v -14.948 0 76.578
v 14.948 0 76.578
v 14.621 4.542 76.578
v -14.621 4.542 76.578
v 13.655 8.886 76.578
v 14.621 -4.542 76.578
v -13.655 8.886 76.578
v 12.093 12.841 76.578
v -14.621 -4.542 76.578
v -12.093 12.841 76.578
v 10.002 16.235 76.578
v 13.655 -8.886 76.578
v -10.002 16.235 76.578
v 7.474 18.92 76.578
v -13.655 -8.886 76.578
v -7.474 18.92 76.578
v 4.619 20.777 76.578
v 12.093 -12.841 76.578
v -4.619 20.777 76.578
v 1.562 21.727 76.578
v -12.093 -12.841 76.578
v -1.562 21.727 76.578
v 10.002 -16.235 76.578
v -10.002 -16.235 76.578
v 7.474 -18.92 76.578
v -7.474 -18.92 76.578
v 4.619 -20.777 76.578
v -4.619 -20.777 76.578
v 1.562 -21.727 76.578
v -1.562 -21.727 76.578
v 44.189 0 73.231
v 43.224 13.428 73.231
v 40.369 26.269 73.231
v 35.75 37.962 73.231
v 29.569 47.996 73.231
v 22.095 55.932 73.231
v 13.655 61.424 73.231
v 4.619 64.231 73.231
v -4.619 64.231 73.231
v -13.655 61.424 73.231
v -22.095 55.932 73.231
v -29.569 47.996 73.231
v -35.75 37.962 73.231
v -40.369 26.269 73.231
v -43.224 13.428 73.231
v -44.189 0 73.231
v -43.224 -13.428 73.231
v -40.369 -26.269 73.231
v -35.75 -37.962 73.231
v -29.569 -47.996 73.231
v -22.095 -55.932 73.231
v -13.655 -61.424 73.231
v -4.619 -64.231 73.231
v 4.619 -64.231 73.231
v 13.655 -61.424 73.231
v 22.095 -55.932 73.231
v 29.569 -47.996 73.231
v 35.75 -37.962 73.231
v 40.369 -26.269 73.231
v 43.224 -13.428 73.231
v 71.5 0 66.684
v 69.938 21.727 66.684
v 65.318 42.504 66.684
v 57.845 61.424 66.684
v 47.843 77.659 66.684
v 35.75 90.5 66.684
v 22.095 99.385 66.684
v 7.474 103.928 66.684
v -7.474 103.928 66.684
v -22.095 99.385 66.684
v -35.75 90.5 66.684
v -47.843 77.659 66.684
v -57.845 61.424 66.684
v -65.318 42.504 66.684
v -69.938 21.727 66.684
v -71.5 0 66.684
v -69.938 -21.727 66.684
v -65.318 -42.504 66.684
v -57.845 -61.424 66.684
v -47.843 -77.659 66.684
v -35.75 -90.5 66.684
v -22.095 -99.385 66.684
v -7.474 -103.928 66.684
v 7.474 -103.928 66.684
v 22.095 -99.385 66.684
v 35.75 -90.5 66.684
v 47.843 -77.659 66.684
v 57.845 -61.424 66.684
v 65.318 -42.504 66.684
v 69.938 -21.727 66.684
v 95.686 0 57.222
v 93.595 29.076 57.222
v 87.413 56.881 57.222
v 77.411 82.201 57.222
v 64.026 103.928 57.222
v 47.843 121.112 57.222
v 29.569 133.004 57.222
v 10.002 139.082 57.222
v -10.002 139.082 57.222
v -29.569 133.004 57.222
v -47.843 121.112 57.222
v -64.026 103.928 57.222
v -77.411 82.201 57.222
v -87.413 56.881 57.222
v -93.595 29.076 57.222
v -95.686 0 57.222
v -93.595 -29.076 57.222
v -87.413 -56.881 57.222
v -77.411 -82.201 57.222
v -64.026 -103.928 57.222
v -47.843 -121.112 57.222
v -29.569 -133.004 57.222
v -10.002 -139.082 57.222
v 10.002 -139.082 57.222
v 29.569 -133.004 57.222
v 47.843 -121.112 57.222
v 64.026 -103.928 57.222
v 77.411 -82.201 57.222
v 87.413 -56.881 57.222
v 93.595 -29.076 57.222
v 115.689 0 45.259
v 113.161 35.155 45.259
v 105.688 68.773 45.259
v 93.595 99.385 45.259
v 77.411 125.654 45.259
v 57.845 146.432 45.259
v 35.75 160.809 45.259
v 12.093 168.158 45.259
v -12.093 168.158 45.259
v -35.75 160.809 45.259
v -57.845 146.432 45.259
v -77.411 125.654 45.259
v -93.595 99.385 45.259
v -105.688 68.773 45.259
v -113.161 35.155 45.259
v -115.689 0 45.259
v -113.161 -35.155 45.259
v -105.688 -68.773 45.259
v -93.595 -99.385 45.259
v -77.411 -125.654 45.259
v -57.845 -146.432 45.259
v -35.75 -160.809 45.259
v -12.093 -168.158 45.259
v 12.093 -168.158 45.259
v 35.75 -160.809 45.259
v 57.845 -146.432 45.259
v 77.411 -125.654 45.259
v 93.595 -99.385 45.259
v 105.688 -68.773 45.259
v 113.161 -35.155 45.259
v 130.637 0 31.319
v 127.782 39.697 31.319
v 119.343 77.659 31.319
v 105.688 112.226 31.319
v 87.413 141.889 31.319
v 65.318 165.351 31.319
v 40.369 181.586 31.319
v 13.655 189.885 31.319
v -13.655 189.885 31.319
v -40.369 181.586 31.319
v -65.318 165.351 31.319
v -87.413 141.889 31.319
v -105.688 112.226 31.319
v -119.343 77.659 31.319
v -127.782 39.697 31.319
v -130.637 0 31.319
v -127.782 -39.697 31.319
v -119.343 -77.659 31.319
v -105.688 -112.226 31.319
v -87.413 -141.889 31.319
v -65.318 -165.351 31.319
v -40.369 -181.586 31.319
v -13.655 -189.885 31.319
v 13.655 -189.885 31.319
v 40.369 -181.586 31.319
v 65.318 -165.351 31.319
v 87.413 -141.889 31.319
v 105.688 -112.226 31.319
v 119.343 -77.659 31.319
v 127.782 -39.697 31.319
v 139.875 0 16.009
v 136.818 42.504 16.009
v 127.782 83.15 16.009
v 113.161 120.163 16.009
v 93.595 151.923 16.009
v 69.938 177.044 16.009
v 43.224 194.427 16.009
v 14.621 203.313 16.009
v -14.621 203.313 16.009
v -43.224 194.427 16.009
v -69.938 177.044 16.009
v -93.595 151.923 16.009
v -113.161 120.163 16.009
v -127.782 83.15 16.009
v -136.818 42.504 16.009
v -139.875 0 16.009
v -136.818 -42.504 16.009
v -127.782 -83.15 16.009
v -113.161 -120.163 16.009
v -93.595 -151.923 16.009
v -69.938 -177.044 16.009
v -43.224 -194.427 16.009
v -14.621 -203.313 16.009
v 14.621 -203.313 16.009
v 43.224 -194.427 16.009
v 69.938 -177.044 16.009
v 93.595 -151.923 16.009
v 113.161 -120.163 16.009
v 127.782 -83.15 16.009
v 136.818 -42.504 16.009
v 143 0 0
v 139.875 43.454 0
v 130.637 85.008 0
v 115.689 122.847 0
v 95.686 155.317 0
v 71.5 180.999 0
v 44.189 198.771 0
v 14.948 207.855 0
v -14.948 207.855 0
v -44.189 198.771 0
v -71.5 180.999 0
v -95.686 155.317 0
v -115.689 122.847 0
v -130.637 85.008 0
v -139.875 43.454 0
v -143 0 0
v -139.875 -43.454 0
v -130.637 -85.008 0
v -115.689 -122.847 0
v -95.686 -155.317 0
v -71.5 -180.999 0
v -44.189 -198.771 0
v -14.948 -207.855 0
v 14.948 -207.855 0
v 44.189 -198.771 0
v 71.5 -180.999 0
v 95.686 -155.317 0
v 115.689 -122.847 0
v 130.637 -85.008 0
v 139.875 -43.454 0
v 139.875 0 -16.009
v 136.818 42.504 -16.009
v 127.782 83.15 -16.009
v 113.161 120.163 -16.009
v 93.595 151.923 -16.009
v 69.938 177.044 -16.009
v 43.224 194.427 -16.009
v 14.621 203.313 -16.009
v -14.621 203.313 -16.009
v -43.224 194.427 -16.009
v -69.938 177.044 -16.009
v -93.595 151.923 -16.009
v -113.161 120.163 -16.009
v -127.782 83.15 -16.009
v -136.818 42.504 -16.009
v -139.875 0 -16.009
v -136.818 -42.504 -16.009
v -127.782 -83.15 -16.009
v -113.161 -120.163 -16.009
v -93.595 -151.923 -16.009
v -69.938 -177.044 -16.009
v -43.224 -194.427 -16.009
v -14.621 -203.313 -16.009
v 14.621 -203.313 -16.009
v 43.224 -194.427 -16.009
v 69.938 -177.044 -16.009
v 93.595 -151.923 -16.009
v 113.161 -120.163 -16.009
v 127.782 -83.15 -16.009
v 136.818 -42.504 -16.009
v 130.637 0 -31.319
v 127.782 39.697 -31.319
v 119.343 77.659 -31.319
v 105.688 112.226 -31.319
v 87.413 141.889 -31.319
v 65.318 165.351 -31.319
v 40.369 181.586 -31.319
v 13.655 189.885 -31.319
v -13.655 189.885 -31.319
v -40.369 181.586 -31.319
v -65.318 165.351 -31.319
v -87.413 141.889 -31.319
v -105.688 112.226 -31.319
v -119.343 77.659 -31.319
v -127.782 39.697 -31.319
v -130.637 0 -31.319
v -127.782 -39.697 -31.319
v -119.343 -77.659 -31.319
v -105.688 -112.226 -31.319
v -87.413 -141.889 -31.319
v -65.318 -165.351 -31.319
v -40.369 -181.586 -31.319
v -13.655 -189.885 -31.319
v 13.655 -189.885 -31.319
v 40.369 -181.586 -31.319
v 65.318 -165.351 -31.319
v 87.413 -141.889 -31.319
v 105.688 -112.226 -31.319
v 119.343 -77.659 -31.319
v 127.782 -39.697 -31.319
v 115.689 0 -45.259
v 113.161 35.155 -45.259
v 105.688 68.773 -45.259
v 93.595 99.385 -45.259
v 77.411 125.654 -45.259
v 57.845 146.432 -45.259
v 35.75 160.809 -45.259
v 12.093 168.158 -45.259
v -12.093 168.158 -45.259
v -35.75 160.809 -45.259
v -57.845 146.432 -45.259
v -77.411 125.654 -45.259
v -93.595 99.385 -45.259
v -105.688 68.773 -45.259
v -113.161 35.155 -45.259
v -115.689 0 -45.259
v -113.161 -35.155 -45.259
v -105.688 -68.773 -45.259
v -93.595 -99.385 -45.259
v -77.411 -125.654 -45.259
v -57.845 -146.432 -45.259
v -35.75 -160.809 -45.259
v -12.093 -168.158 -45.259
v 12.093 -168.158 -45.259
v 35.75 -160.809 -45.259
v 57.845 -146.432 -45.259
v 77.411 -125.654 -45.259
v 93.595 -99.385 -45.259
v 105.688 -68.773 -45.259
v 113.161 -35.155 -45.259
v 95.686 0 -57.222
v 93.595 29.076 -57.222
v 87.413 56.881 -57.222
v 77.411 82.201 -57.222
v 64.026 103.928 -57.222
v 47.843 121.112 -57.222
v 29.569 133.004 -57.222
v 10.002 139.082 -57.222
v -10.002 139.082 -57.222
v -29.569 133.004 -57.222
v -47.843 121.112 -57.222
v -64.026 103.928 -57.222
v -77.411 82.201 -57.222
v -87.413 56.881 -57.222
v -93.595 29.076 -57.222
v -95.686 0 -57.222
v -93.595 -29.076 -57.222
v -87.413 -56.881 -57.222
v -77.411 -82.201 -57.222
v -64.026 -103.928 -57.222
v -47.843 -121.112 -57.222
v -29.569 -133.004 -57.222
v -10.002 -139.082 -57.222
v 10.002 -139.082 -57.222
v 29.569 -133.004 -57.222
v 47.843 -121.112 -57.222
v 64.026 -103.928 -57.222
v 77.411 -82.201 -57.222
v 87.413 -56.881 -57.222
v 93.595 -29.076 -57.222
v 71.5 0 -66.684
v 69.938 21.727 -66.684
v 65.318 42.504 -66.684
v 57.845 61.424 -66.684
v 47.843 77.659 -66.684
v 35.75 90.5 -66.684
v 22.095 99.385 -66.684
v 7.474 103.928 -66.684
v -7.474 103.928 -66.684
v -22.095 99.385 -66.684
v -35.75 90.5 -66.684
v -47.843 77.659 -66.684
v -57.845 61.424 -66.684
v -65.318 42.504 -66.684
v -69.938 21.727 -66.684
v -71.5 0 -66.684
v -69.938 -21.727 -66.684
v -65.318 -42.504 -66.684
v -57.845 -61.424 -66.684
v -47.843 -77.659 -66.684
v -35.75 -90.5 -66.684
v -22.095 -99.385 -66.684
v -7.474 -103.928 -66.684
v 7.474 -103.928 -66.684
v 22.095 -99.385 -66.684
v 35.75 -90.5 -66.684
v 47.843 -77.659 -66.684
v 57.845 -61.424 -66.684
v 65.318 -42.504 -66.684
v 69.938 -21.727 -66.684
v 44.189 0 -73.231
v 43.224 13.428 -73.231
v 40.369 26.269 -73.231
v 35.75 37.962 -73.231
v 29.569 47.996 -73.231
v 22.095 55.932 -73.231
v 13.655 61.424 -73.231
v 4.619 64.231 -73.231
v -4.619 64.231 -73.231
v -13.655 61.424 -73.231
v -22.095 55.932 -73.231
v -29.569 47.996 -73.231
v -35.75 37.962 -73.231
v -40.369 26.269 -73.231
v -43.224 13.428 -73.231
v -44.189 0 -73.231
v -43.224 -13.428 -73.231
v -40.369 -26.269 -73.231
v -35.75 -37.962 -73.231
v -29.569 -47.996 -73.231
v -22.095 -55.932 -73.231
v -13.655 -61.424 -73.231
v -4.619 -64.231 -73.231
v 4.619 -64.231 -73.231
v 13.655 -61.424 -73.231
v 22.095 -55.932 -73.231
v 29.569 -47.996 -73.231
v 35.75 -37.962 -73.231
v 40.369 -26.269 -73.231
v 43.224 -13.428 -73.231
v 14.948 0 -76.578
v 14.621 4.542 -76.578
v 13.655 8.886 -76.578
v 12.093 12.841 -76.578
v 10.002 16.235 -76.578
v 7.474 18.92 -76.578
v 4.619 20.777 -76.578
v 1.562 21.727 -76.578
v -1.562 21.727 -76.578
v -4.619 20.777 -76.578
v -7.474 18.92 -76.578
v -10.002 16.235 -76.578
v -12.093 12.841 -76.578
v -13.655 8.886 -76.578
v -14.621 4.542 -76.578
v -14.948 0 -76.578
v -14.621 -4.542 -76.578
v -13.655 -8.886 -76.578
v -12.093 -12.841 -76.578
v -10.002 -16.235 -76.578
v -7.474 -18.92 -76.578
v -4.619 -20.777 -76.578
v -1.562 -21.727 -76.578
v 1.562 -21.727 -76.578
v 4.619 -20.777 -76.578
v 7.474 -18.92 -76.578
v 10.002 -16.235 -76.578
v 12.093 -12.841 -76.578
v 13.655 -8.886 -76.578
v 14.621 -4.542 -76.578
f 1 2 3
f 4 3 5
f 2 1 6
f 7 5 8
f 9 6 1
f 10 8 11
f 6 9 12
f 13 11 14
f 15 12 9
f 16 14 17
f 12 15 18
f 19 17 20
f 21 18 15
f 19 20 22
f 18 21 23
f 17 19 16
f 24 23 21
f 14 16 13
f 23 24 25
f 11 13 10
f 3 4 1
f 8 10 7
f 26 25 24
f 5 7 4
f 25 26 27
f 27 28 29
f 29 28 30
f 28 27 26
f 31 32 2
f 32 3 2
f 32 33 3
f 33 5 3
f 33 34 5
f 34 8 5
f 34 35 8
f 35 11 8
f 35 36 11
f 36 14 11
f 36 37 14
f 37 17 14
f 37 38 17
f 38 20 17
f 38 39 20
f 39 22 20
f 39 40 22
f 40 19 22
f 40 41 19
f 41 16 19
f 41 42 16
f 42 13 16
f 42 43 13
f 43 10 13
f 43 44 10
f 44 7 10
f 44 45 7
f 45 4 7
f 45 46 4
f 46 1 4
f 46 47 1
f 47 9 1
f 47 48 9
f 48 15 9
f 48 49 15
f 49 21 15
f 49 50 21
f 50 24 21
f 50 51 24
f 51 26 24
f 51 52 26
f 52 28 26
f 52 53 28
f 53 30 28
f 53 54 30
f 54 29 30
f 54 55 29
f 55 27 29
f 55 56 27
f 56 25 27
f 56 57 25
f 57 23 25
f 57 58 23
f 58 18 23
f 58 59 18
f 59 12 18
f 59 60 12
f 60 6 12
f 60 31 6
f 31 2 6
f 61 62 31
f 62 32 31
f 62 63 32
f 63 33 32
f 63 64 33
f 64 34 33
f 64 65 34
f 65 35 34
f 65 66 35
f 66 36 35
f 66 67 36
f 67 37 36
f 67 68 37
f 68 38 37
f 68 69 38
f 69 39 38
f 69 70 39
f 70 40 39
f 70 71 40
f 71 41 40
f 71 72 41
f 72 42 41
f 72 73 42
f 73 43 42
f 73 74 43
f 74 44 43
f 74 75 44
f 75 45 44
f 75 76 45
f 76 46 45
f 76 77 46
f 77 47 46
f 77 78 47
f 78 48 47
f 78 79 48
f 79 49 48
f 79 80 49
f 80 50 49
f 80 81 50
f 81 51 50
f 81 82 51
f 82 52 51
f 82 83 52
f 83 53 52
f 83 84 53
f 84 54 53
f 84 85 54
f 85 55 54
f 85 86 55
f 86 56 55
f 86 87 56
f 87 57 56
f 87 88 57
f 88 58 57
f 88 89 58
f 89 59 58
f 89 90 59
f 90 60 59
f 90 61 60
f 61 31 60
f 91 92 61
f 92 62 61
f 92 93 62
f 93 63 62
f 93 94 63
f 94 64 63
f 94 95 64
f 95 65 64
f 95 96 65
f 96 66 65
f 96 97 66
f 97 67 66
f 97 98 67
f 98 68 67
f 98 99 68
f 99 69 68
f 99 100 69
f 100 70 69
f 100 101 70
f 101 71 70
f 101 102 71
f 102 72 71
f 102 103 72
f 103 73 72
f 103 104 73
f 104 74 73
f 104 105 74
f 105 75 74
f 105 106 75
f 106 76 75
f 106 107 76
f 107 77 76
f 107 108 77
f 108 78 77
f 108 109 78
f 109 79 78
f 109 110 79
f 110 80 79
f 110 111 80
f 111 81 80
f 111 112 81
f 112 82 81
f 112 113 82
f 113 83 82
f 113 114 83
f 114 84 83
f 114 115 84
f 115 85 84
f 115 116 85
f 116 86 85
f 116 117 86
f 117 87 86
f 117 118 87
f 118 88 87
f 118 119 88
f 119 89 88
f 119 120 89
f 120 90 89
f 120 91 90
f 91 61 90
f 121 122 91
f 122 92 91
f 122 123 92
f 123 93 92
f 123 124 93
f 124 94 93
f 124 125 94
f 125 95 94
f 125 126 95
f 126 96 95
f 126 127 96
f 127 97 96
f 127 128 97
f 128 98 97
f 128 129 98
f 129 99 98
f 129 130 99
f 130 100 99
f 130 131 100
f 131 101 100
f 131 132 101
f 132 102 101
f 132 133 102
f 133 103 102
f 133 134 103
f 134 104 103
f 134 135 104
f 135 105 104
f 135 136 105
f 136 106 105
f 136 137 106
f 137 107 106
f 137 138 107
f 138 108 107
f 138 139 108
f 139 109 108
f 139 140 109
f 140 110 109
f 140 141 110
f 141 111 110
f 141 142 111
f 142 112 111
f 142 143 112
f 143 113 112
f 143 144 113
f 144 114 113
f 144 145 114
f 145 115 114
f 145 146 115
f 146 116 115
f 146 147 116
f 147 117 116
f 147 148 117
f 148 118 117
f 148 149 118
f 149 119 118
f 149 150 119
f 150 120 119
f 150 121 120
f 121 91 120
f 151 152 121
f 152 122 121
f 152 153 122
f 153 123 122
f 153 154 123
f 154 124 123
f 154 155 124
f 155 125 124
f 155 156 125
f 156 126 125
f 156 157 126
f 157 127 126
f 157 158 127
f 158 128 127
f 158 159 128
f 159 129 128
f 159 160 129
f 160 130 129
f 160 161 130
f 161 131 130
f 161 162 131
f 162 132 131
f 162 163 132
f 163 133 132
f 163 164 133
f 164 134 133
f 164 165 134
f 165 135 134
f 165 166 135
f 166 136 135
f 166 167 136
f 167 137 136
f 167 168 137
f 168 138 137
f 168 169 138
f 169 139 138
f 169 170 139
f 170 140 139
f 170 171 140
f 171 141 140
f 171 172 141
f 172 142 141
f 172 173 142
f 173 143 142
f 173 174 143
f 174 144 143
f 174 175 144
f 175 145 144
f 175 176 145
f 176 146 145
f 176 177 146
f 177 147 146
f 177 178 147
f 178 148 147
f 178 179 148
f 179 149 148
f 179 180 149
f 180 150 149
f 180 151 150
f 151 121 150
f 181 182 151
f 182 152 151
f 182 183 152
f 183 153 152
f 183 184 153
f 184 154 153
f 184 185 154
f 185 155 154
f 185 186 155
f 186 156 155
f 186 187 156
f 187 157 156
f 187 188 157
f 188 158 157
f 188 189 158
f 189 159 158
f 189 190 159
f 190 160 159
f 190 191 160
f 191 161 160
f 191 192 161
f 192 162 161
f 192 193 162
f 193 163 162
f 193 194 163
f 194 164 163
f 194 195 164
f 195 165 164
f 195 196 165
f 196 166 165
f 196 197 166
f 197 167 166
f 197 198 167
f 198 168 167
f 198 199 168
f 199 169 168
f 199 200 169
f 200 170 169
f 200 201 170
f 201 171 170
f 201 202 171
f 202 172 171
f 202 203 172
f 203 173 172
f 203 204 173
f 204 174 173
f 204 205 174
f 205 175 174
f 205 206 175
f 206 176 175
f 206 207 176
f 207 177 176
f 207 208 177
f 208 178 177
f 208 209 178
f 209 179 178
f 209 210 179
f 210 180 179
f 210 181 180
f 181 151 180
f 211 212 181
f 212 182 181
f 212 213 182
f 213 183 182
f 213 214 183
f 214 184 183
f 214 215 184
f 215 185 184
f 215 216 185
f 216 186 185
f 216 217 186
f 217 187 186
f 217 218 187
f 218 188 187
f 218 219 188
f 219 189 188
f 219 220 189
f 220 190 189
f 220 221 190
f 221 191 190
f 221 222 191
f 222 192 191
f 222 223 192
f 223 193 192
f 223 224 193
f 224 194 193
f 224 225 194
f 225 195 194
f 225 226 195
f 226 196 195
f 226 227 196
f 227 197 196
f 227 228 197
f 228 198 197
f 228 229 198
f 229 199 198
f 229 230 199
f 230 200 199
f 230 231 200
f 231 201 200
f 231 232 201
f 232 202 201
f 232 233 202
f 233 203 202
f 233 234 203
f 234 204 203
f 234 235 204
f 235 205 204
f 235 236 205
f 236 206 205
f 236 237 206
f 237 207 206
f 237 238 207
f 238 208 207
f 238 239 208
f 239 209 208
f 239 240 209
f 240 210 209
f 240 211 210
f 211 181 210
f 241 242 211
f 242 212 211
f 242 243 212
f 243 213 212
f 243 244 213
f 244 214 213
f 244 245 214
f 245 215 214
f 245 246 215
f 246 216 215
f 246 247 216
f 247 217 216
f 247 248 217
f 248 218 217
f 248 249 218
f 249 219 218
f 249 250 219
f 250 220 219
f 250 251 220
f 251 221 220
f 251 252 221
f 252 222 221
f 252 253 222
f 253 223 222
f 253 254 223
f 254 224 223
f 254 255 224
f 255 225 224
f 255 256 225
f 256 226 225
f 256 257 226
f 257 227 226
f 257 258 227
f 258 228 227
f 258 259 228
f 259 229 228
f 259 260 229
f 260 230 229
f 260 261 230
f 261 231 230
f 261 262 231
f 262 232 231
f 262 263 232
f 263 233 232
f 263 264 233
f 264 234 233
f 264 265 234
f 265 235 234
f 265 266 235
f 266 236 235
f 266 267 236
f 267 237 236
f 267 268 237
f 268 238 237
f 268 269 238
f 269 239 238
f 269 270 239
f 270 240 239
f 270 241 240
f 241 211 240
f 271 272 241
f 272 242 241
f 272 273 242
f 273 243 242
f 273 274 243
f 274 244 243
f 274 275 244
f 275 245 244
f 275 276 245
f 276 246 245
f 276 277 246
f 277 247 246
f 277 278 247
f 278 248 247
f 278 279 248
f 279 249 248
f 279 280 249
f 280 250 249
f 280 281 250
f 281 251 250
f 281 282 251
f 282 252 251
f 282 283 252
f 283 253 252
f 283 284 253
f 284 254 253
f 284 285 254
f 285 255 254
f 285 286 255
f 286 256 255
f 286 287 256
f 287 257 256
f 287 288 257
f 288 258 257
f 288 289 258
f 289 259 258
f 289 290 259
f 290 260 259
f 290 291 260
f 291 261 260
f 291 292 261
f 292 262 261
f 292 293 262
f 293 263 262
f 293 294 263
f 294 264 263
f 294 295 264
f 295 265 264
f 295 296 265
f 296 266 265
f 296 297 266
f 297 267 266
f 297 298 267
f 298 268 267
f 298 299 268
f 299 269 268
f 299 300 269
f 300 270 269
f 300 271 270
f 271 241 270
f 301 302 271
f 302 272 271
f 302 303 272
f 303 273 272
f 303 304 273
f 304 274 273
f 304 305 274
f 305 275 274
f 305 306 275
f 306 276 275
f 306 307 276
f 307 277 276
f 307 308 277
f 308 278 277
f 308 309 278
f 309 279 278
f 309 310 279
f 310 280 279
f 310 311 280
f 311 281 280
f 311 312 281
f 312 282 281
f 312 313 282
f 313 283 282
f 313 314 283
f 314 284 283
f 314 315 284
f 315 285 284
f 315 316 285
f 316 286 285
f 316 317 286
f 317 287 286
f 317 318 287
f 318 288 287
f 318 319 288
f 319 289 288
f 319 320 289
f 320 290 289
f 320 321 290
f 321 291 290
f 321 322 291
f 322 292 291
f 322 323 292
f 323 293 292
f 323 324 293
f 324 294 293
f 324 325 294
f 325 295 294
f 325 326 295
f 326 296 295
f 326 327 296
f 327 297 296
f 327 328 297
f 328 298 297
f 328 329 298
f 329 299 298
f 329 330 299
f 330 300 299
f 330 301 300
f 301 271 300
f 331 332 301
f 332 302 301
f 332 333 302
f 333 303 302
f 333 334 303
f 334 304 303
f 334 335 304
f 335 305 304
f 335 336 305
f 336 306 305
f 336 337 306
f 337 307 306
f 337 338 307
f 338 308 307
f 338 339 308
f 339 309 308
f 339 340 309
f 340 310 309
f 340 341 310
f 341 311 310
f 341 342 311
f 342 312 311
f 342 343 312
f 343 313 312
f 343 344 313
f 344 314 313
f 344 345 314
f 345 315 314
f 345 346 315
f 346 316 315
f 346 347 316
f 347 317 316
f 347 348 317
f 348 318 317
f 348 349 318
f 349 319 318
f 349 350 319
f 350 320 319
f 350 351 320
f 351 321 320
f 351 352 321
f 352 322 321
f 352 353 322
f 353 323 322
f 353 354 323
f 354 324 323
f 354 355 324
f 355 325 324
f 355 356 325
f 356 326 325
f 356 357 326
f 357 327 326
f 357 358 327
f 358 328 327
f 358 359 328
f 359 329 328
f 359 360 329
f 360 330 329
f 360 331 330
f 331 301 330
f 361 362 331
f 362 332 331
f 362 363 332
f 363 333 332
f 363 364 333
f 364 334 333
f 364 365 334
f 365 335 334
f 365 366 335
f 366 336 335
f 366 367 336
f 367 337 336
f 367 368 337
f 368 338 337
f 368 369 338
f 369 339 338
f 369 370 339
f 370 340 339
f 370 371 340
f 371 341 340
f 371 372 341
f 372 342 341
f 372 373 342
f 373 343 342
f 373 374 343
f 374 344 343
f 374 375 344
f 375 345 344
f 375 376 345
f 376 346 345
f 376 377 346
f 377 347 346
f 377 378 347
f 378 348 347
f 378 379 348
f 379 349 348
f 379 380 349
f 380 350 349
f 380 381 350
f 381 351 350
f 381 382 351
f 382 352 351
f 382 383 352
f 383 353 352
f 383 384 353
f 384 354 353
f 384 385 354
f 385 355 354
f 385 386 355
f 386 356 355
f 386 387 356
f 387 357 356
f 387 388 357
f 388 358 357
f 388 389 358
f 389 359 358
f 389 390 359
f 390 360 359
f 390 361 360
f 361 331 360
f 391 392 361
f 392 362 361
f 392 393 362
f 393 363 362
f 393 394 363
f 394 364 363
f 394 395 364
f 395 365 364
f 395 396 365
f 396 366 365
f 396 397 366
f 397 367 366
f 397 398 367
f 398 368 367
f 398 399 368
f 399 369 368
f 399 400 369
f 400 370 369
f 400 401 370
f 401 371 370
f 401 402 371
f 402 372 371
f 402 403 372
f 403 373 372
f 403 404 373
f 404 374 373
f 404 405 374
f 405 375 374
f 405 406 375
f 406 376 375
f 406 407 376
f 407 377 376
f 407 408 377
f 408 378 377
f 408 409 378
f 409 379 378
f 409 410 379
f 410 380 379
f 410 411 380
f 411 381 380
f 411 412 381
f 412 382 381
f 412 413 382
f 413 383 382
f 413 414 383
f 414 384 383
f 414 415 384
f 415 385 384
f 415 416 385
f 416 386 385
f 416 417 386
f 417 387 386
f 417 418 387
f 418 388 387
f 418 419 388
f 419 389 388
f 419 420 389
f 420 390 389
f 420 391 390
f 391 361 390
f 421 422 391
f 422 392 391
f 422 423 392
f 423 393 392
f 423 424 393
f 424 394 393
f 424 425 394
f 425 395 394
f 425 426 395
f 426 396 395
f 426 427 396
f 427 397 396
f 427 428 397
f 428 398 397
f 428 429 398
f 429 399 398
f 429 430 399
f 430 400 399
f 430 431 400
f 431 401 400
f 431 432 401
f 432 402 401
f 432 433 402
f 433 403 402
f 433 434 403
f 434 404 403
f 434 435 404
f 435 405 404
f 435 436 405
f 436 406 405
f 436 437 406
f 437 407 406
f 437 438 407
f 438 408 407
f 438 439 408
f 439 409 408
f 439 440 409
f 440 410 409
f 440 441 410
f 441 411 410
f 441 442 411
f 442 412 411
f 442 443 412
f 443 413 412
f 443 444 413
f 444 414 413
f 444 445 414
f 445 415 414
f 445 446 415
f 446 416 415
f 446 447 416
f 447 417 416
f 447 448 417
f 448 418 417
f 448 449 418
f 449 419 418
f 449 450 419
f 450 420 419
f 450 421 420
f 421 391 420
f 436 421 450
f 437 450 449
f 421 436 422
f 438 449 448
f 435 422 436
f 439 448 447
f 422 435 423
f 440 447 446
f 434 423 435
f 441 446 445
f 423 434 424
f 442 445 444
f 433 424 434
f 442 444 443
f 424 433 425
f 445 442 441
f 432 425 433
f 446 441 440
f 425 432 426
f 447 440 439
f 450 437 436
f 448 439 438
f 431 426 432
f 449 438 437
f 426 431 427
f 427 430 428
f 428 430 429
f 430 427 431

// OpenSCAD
// Generated by SolidPython 1.0.1 on 2020-07-29 00:46:51


scale(v = [13, 19, 7]) {
	sphere(r = 11);
}
/***********************************************
*********      SolidPython code:      **********
************************************************
 
# import packages: SolidPython
from solid import *
from solid.utils import *
from itertools import chain, combinations, permutations


class Resize:

    def __init__(self, scad_file):
        self.scad_file = scad_file
        #self.scad_file = import_scad(scad_file)
        # cone/cylinder param:
        self.r1 = 0
        self.r2 = 0
        self.h = 0
        # rectangular prism param:
        self.w = 0
        self.l = 0
        # ellipse param:
        self.r = 0

    # import OpenScad code (file name corresponds to shape)


    # classify shape + parameters
    def assign(self, param1, param2, param3):
        if self.scad_file == 'cone.scad':
            self.r1 = param1
            self.r2 = param2
            self.h = param3
        elif self.scad_file == 'cylinder.scad':
            self.r1 = param1
            self.r2 = param2
            self.h = param3
        elif self.scad_file == 'rectangularPrism.scad':
            self.h = param1
            self.l = param2
            self.w = param3
        else:
            self.r = param1
            self.h = param2

    # resize parameters
    def iterate(self):
        x = range(3, 20, 2)
        i = 1
        if self.scad_file == 'cone.scad':
            tempList = list(permutations(x, 2))
            for temp in tempList:
                param1 = temp[0]
                param2 = temp[1]
                filepath = 'produced_scad_files/' + 'cone' + str(param1) + '_' + str(param2) + '_' + '.scad'
                scad_render_to_file(cylinder(h=param1, r1=param2, r2=0), filepath)

        elif self.scad_file == 'cylinder.scad':
            tempList = list(permutations(x, 3))
            for temp in tempList:
                param1 = temp[0]
                param2 = temp[1]
                filepath = 'produced_scad_files/' + 'cylinder' + str(param1) + '_' + str(param2) + '_' + '.scad'
                scad_render_to_file(cylinder(h=param1, r1=param2, r2=param2), filepath)

        elif self.scad_file == 'rectangularPrism.scad':
            tempList = list(permutations(x, 3))
            for temp in tempList:
                param1 = temp[0]
                param2 = temp[1]
                param3 = temp[2]
                filepath = 'produced_scad_files/' + 'rectangularPrism' + str(param1) + '_' + str(param2) + '_' + str(
                    param3) + '.scad'
                scad_render_to_file(cube(size=(param1, param2, param3)), filepath)

        elif self.scad_file == 'ellipse.scad':
            tempList = list(permutations(x, 4))
            for temp in tempList:
                param1 = temp[0]
                param2 = temp[1]
                param3 = temp[2]
                param4 = temp[3]
                filepath = 'produced_scad_files/' + 'ellipse' + str(param1) + '_' + str(param2) + '_' + str(param3) + '_' + str(param4) + '.scad'
                scad_render_to_file(scale([param1, param2, param3])(sphere(r=param4)), filepath)

    def render_to_scadfile(self):
        scad_render_to_file(scad, 'example.scad') 
 
************************************************/
